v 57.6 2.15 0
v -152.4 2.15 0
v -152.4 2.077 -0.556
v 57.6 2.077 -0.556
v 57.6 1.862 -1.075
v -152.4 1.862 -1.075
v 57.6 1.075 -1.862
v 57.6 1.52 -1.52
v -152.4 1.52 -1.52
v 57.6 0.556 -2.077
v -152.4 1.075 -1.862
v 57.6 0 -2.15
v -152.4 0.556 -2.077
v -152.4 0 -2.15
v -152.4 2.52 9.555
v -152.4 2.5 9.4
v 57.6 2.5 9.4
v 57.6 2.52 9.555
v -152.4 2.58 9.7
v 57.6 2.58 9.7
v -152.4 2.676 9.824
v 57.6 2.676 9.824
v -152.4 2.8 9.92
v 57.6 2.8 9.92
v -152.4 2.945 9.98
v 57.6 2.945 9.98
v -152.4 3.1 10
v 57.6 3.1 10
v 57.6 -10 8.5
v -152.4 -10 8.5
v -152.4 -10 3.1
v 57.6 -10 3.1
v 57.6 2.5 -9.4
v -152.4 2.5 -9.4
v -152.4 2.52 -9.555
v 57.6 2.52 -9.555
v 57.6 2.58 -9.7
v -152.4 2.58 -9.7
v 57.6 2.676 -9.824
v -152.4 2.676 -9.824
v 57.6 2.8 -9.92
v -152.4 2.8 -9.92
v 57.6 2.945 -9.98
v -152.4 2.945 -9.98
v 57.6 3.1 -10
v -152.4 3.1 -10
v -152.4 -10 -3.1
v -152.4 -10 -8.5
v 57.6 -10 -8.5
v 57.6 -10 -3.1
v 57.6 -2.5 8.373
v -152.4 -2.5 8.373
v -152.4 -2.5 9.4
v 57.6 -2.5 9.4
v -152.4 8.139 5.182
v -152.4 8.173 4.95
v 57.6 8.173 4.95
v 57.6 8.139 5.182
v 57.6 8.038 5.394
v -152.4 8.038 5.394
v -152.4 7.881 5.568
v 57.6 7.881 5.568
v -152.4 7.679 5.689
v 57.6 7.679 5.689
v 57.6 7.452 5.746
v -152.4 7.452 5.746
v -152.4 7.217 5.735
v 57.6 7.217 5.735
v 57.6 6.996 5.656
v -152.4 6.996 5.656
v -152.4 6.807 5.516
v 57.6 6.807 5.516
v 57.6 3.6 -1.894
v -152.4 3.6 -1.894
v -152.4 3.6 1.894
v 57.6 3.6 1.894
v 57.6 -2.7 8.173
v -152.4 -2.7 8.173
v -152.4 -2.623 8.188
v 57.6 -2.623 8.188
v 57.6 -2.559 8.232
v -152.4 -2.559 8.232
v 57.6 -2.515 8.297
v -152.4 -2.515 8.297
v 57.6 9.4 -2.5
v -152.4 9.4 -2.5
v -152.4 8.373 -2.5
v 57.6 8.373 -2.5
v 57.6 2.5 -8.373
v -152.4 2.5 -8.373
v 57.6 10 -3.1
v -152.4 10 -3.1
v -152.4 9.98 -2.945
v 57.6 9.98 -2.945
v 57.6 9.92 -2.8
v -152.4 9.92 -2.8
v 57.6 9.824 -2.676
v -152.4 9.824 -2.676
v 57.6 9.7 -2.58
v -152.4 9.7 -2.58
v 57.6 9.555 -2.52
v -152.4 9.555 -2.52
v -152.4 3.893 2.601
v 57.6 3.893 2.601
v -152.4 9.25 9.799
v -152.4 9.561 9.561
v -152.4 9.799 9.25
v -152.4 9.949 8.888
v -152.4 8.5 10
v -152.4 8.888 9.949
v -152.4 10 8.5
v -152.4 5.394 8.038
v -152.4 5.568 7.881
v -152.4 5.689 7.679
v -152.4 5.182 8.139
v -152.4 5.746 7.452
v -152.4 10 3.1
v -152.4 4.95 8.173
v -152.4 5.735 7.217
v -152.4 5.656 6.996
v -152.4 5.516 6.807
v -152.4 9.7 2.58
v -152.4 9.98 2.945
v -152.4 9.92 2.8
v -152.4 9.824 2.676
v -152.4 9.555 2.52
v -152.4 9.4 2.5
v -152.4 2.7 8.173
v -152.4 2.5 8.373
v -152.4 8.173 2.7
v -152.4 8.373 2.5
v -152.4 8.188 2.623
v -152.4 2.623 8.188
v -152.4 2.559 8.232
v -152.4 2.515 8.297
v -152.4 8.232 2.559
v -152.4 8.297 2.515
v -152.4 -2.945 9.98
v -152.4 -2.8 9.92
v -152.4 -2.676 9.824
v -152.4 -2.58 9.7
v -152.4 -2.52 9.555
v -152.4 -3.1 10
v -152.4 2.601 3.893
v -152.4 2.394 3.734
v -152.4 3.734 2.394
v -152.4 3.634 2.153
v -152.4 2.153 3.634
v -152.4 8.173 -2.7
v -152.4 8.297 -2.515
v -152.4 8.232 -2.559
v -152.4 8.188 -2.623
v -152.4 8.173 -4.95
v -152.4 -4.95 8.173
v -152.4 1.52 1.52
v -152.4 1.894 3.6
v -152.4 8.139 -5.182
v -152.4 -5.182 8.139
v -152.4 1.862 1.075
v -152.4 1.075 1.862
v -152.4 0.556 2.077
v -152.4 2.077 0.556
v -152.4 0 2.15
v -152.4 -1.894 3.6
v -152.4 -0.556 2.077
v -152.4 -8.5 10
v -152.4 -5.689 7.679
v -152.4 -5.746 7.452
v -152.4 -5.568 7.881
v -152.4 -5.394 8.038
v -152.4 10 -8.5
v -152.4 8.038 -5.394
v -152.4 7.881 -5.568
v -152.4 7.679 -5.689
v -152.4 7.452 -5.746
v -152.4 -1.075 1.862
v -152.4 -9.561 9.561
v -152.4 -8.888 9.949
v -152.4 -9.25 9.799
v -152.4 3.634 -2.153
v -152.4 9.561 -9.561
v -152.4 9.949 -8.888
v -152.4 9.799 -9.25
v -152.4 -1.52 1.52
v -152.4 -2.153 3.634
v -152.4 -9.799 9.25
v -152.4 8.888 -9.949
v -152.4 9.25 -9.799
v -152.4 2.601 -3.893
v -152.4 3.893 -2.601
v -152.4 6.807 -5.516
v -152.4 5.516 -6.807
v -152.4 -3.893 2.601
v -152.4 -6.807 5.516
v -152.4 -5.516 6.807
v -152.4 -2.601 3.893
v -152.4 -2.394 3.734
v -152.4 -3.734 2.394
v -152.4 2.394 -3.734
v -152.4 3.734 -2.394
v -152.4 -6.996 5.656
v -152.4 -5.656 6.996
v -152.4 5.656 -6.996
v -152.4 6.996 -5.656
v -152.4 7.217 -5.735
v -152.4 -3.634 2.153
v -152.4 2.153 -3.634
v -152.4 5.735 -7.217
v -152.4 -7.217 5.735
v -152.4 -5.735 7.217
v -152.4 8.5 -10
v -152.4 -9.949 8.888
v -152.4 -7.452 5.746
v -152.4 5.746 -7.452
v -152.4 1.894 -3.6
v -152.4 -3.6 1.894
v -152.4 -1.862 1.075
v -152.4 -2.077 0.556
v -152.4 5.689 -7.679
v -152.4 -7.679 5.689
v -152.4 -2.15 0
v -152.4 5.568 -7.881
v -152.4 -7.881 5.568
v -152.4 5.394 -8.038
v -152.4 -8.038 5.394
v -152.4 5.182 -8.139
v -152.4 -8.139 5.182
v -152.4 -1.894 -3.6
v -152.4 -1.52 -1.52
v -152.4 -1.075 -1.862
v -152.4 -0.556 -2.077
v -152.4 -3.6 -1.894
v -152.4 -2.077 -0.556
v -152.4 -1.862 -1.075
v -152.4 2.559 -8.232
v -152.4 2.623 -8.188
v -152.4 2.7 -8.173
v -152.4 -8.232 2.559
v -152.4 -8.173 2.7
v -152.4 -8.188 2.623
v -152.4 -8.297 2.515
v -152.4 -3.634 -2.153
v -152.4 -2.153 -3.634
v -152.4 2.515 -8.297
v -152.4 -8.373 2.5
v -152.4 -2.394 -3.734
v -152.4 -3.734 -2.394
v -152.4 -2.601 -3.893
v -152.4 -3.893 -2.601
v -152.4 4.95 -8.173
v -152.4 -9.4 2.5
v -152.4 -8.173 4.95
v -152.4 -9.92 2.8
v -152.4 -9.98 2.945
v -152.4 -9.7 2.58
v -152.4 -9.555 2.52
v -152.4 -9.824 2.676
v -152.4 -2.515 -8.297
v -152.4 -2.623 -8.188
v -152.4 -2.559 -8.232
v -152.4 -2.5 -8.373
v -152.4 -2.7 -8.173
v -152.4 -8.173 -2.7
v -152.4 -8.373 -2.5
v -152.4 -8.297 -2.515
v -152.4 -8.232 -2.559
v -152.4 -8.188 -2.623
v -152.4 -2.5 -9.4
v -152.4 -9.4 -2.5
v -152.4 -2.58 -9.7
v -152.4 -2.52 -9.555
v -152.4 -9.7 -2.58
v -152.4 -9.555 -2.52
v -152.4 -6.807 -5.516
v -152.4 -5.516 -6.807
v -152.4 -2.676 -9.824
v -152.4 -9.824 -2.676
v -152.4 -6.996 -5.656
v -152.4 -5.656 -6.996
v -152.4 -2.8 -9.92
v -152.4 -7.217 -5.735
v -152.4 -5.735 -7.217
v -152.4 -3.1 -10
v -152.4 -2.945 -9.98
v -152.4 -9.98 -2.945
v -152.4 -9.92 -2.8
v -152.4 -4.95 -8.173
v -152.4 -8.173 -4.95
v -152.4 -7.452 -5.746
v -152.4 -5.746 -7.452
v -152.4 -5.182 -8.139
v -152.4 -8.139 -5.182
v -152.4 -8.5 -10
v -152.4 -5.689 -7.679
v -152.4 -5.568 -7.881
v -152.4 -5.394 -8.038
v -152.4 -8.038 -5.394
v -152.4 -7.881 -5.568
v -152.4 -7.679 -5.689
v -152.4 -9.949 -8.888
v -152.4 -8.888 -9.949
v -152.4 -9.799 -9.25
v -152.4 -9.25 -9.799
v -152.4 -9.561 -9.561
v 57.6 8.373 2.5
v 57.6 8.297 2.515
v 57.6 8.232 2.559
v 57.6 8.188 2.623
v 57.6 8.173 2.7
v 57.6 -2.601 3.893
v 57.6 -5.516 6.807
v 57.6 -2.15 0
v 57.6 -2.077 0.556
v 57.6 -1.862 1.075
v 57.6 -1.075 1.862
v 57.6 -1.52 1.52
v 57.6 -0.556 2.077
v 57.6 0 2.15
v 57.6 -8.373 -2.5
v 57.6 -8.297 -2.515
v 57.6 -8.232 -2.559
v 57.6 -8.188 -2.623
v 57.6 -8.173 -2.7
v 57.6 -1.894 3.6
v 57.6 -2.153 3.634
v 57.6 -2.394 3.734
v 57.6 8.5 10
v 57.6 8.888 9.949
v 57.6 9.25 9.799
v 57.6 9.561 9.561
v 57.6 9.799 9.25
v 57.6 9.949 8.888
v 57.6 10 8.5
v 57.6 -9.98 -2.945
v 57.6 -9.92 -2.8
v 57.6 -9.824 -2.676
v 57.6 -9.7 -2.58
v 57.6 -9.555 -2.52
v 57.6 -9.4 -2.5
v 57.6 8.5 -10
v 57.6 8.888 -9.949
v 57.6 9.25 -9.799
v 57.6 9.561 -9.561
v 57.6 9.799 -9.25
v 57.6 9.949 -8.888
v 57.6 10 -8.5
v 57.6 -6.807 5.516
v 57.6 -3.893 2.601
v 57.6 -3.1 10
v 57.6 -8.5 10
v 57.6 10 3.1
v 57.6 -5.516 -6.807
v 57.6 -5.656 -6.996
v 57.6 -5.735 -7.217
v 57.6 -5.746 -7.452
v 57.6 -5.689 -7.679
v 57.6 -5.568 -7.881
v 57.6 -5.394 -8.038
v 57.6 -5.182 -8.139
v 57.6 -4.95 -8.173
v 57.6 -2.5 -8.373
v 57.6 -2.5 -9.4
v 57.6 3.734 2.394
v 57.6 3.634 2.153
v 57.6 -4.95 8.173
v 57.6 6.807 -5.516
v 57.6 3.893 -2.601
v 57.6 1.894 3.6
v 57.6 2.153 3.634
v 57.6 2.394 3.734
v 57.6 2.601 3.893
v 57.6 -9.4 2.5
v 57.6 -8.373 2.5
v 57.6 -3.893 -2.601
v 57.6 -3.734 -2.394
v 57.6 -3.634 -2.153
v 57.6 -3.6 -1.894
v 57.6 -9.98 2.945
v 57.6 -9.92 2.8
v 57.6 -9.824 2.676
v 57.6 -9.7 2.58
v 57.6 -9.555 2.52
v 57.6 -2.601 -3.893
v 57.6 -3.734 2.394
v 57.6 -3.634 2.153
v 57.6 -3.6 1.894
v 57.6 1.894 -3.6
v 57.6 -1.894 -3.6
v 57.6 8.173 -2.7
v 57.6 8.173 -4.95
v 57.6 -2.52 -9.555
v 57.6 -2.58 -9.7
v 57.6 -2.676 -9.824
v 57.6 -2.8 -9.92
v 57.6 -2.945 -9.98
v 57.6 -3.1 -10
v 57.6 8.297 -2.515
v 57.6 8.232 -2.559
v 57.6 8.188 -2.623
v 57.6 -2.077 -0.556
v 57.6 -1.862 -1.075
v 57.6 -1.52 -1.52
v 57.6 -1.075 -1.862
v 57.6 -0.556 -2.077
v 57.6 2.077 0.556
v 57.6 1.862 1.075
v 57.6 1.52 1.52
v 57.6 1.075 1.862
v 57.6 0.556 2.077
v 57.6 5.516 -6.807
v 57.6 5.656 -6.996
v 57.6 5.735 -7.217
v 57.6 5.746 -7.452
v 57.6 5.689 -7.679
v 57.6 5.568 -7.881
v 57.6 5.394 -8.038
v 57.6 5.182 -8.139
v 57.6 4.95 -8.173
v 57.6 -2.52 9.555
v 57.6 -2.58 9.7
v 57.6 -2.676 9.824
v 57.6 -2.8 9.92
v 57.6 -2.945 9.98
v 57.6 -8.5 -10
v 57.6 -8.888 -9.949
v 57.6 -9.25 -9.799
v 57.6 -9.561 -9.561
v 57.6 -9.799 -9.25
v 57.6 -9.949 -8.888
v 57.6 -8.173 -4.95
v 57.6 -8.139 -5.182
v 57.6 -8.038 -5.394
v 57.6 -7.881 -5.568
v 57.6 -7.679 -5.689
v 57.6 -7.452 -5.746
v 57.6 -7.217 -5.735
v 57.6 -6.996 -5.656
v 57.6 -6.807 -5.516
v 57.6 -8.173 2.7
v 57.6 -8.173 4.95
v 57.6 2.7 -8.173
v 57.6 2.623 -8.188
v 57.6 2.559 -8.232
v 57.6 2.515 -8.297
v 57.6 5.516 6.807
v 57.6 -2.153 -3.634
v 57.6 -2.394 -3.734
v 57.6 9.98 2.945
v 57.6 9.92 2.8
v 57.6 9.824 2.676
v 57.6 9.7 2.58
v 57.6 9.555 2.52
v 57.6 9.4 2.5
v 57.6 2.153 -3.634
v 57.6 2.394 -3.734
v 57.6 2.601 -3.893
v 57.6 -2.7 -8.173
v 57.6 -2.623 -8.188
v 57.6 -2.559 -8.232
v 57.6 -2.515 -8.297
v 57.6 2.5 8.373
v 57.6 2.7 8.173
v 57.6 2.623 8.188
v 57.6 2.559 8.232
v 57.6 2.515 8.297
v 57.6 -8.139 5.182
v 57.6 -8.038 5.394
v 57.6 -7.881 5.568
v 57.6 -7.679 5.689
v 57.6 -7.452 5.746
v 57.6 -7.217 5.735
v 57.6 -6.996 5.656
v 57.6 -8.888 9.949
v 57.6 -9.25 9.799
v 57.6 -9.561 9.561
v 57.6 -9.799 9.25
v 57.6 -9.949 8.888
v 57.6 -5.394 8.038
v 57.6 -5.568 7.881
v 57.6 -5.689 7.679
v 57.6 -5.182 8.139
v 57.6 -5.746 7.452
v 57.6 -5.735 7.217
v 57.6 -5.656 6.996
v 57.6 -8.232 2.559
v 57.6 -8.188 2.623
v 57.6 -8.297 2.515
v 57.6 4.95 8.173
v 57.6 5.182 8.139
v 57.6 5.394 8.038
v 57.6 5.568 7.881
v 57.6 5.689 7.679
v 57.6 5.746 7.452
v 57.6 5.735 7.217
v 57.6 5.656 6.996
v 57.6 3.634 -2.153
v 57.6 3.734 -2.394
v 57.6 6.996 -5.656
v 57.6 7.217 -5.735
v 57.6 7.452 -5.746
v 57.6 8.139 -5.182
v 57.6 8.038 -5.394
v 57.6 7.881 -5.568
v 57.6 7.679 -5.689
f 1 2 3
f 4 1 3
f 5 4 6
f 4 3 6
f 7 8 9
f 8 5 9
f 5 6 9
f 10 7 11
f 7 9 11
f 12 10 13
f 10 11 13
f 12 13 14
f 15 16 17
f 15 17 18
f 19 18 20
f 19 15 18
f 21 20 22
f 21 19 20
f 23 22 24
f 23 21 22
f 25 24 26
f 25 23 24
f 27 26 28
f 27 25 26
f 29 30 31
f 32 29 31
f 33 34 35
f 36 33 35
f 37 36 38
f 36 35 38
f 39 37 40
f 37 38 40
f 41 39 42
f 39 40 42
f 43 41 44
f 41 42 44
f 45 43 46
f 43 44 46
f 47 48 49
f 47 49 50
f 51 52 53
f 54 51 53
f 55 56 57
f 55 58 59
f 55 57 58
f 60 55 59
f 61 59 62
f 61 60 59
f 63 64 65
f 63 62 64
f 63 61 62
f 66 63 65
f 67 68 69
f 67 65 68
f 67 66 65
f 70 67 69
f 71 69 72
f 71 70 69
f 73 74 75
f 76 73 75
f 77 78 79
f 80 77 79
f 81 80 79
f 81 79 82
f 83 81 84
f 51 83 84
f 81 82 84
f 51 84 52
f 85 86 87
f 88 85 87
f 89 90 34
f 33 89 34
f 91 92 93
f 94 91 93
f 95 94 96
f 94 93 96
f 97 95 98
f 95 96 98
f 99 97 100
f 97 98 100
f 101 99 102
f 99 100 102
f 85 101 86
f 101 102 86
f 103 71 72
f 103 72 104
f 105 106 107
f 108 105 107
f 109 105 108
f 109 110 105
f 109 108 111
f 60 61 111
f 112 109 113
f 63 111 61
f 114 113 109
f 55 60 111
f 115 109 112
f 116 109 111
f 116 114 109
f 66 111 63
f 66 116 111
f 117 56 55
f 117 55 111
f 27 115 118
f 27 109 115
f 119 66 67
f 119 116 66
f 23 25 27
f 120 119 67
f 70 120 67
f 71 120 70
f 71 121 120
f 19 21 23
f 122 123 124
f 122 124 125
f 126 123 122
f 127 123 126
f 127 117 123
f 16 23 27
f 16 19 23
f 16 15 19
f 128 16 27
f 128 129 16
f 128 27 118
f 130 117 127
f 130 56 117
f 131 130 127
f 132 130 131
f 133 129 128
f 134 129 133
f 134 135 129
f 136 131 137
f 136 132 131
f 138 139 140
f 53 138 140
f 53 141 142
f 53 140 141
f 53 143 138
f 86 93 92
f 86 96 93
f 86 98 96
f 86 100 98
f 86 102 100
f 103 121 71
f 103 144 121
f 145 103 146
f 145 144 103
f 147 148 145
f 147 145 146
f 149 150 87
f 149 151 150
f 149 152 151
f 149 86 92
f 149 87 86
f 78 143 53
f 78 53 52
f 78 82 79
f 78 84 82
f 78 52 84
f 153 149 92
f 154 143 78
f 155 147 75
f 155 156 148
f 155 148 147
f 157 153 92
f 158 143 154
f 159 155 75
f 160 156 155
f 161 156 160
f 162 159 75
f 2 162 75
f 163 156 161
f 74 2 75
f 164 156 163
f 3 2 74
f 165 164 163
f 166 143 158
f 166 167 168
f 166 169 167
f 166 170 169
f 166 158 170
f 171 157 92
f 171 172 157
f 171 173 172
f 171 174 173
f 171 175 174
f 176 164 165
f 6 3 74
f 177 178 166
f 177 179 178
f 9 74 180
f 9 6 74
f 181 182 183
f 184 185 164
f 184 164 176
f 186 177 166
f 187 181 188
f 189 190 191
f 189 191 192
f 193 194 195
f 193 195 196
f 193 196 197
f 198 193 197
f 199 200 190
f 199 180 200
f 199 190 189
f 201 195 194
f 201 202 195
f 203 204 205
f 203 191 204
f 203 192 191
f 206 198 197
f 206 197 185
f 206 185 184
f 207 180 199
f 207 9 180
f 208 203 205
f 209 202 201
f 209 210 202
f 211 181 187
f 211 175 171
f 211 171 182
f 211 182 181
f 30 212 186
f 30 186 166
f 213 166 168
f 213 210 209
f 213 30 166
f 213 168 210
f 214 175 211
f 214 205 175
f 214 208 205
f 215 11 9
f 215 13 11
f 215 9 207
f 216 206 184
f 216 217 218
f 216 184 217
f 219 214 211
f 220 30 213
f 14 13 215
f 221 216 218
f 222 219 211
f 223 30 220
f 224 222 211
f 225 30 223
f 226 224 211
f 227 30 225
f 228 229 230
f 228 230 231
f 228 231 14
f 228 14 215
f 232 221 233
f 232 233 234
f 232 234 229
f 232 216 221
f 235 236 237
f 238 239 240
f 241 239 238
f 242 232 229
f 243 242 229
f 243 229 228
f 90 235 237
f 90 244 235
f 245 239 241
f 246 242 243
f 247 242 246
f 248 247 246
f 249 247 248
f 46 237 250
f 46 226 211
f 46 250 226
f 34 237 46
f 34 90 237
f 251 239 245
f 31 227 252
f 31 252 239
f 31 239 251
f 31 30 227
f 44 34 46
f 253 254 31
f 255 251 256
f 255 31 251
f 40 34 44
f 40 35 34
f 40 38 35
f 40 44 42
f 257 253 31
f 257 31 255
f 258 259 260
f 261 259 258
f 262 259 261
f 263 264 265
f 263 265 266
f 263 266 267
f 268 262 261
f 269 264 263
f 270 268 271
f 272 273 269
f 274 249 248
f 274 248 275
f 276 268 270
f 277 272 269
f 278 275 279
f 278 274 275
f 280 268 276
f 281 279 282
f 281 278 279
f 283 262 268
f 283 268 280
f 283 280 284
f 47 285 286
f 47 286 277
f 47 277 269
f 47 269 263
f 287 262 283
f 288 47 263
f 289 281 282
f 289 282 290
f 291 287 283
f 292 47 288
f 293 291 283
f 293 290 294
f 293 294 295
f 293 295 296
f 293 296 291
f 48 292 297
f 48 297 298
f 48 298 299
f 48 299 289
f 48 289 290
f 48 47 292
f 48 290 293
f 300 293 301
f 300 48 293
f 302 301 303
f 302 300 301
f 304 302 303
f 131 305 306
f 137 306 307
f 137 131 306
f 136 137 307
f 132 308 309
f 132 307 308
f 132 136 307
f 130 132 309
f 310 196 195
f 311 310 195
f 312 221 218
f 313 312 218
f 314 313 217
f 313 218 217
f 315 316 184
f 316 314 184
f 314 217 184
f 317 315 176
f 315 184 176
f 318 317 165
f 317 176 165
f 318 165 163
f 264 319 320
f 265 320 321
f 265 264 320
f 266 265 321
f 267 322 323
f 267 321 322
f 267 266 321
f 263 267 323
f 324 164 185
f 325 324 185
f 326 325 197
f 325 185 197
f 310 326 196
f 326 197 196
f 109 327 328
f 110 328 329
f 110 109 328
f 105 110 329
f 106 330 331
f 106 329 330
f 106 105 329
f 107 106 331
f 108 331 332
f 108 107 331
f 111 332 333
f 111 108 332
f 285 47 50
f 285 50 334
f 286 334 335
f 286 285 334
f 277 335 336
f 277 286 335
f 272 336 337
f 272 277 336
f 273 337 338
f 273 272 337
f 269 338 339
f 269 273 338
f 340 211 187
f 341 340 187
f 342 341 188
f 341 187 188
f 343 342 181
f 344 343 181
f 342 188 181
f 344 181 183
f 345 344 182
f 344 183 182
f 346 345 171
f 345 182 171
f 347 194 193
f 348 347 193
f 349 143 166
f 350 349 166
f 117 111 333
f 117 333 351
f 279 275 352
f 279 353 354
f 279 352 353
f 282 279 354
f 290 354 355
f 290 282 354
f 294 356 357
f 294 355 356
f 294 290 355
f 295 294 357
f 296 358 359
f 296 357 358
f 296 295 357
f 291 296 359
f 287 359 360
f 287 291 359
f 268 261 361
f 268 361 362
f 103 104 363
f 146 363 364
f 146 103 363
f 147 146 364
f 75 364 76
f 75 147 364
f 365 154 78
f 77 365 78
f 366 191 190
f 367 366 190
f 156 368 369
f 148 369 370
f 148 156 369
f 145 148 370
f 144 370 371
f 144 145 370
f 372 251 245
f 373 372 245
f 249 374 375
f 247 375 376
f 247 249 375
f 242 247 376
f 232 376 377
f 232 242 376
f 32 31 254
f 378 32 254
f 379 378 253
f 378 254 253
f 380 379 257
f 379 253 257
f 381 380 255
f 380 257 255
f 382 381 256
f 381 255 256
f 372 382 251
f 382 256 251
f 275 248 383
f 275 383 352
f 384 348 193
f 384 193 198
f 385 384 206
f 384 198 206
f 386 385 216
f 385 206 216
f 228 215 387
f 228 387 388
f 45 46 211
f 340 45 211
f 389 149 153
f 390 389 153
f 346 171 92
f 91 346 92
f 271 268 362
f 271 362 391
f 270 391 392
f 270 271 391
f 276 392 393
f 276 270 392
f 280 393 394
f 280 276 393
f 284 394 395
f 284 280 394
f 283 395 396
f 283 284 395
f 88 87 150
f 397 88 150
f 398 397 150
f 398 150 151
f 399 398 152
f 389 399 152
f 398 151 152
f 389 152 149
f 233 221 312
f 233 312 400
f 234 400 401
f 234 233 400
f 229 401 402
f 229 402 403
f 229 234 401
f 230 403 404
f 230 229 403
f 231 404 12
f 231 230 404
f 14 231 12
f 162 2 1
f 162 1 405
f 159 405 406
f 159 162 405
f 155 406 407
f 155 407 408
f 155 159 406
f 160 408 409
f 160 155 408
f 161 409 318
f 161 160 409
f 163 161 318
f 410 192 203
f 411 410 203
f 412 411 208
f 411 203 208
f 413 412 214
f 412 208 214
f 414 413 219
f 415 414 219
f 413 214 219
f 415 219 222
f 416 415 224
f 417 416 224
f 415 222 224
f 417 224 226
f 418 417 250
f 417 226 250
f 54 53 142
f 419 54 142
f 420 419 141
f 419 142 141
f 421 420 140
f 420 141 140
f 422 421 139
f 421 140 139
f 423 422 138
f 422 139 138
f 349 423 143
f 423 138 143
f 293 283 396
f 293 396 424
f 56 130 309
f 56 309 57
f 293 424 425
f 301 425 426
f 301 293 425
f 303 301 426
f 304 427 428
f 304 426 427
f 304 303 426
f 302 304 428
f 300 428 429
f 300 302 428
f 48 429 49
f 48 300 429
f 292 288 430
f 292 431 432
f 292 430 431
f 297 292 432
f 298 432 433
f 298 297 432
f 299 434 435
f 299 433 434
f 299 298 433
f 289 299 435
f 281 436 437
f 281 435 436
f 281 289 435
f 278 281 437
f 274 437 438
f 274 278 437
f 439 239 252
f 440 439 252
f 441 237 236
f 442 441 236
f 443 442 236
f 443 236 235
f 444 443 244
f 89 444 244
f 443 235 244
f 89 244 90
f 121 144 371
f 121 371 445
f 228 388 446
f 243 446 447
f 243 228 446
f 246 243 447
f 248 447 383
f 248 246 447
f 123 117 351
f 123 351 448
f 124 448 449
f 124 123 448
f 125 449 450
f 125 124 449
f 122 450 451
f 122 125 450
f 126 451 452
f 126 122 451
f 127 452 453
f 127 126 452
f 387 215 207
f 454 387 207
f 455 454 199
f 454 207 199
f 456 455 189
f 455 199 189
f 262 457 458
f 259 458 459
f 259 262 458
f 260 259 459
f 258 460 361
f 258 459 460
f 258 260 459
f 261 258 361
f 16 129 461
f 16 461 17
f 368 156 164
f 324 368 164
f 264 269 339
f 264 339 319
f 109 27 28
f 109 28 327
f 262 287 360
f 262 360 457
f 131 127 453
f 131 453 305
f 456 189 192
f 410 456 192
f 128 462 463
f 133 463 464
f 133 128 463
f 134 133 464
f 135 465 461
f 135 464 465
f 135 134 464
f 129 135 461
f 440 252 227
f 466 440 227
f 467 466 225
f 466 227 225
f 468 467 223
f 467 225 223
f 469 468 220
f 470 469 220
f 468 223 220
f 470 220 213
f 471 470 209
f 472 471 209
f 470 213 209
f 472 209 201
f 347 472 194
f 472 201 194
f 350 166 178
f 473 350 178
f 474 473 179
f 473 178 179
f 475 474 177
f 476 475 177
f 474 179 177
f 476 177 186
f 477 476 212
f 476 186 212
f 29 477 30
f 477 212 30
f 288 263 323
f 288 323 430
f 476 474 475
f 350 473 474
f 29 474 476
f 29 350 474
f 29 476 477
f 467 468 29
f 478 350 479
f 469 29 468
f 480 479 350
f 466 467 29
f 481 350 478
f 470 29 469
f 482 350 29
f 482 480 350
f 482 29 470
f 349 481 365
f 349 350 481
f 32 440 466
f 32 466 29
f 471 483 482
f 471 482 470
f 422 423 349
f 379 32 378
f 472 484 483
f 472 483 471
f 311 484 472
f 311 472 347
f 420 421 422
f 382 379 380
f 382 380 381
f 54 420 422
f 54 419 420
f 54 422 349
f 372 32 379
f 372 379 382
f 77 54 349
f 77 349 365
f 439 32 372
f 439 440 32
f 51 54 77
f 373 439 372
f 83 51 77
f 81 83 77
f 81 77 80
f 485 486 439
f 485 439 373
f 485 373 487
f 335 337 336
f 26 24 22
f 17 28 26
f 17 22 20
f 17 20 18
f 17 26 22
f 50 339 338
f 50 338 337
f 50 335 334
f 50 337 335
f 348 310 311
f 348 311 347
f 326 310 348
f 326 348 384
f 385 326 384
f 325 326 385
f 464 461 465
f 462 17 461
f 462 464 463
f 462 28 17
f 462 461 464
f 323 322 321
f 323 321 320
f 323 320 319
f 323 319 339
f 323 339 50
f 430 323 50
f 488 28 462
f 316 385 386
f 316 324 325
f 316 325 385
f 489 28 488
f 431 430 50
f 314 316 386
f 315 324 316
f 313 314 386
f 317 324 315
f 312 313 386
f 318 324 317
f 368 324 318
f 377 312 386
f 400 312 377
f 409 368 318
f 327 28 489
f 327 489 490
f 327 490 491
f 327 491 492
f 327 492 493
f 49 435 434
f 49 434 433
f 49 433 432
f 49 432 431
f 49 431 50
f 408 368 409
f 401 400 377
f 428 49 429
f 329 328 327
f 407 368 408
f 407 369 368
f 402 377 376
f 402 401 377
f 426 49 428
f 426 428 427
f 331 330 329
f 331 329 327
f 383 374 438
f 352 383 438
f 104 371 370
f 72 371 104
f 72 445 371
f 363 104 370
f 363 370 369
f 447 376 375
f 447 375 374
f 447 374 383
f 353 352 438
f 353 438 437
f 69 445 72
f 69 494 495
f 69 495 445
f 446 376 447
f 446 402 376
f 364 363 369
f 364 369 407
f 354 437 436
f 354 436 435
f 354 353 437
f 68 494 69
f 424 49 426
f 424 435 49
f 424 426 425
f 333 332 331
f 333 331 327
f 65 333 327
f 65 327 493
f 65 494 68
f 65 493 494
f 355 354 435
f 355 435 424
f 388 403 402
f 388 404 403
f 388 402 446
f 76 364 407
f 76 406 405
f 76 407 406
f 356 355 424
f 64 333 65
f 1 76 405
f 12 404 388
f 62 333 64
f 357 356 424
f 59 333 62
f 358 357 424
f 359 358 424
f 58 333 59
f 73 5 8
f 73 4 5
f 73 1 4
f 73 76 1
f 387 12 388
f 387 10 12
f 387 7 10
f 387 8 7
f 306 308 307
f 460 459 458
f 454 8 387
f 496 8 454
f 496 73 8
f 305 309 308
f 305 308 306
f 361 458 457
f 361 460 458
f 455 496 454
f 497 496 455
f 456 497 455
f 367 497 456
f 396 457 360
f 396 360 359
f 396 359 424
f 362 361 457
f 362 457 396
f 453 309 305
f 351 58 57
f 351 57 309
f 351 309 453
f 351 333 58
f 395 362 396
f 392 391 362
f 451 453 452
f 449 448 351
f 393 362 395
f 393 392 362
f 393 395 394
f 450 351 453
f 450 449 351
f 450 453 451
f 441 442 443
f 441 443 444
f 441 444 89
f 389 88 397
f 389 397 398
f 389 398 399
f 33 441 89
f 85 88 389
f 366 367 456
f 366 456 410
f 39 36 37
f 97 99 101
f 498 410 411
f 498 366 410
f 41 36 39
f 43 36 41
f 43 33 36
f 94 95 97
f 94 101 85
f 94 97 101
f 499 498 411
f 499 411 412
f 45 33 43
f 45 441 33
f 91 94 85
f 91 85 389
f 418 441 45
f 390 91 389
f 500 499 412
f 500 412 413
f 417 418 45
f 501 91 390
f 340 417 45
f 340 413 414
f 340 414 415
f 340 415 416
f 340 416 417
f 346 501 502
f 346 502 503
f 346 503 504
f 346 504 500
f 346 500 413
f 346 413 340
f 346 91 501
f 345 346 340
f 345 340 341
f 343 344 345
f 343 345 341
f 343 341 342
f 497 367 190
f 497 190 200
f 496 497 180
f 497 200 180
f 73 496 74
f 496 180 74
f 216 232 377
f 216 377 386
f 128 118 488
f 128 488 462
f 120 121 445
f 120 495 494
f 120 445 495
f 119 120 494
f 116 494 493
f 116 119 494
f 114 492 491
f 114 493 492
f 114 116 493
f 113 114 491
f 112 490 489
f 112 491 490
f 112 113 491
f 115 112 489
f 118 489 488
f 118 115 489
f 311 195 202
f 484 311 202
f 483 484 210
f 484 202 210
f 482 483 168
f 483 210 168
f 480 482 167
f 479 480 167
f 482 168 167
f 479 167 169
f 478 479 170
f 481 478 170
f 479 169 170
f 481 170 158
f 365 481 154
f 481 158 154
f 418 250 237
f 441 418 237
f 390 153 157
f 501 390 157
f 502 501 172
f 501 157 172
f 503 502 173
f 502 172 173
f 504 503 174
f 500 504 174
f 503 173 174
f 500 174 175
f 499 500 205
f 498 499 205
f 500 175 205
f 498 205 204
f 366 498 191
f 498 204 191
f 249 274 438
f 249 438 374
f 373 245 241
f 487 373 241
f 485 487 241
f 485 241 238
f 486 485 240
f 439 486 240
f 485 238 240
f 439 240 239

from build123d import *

# Parameters (mm, degrees)
BOSS_EXTRUDE1_DEPTH      = 152.4
BOSS_EXTRUDE1_DEPTH_BACK = 152.4
CUT_EXTRUDE1_START       = -94.8
SKETCH4_R                = 2.15
CUT_EXTRUDE1_DEPTH       = 94.8


with BuildPart() as part:
    # Sketch3 → Boss-Extrude1 (new, two sides: drawn at the far end of the back side and taken through both)
    with BuildSketch(Plane(origin=(0, 0, 0), x_dir=(0, 0, -1), z_dir=(1, 0, 0)).offset(-BOSS_EXTRUDE1_DEPTH_BACK)):
        with BuildLine():
            Line((-5.515685425, 6.807463915), (-2.601114729, 3.892893219))
            ThreePointArc((-2.601114729, 3.892893219), (-2.27669138, 3.676120467), (-1.894007948, 3.6))
            Line((-1.894007948, 3.6), (0, 3.6))
            Line((0, 3.6), (0, 2.15))
            ThreePointArc((0, 2.15), (-1.52027958, 1.52027958), (-2.15, 0))
            Line((-2.15, 0), (-3.6, 0))
            Line((-3.6, 0), (-3.6, 1.894007948))
            ThreePointArc((-3.6, 1.894007948), (-3.676120467, 2.27669138), (-3.892893219, 2.601114729))
            Line((-3.892893219, 2.601114729), (-6.807463915, 5.515685425))
            ThreePointArc((-6.807463915, 5.515685425), (-7.679296086, 5.689103626), (-8.17314934, 4.95))
            Line((-8.17314934, 4.95), (-8.17314934, 2.7))
            ThreePointArc((-8.17314934, 2.7), (-8.231727984, 2.558578644), (-8.37314934, 2.5))
            Line((-8.37314934, 2.5), (-9.4, 2.5))
            ThreePointArc((-9.4, 2.5), (-9.824264069, 2.675735931), (-10, 3.1))
            Line((-10, 3.1), (-10, 8.5))
            ThreePointArc((-10, 8.5), (-9.560660172, 9.560660172), (-8.5, 10))
            Line((-8.5, 10), (-3.1, 10))
            ThreePointArc((-3.1, 10), (-2.675735931, 9.824264069), (-2.5, 9.4))
            Line((-2.5, 9.4), (-2.5, 8.37314934))
            ThreePointArc((-2.5, 8.37314934), (-2.558578644, 8.231727984), (-2.7, 8.17314934))
            Line((-2.7, 8.17314934), (-4.95, 8.17314934))
            ThreePointArc((-4.95, 8.17314934), (-5.689103626, 7.679296086), (-5.515685425, 6.807463915))
        make_face()
    extrude(amount=BOSS_EXTRUDE1_DEPTH + BOSS_EXTRUDE1_DEPTH_BACK)

    # Mirror1: part across plane


with BuildPart() as part_1:
    add(part.part)
    add(part.part.mirror(Plane.ZX))

    # Mirror2: part across plane


with BuildPart() as part_2:
    add(part_1.part)
    add(part_1.part.mirror(Plane.XY))

    # Sketch4 → Cut-Extrude1 (cut)
    with BuildSketch(Plane(origin=(152.4, 0, 0), x_dir=(0, 0, -1), z_dir=(1, 0, 0)).offset(CUT_EXTRUDE1_START)):
        with BuildLine():
            Line((1.894007948, 3.6), (-1.894007948, 3.6))
            ThreePointArc((-1.894007948, 3.6), (-2.27669138, 3.676120467), (-2.601114729, 3.892893219))
            Line((-2.601114729, 3.892893219), (-5.515685425, 6.807463915))
            ThreePointArc((-5.515685425, 6.807463915), (-5.689103626, 7.679296086), (-4.95, 8.17314934))
            Line((-4.95, 8.17314934), (-2.7, 8.17314934))
            ThreePointArc((-2.7, 8.17314934), (-2.558578644, 8.231727984), (-2.5, 8.37314934))
            Line((-2.5, 8.37314934), (-2.5, 9.4))
            ThreePointArc((-2.5, 9.4), (-2.675735931, 9.824264069), (-3.1, 10))
            Line((-3.1, 10), (-8.5, 10))
            ThreePointArc((-8.5, 10), (-9.560660172, 9.560660172), (-10, 8.5))
            Line((-10, 8.5), (-10, 3.1))
            ThreePointArc((-10, 3.1), (-9.824264069, 2.675735931), (-9.4, 2.5))
            Line((-9.4, 2.5), (-8.37314934, 2.5))
            ThreePointArc((-8.37314934, 2.5), (-8.231727984, 2.558578644), (-8.17314934, 2.7))
            Line((-8.17314934, 2.7), (-8.17314934, 4.95))
            ThreePointArc((-8.17314934, 4.95), (-7.679296086, 5.689103626), (-6.807463915, 5.515685425))
            Line((-6.807463915, 5.515685425), (-3.892893219, 2.601114729))
            ThreePointArc((-3.892893219, 2.601114729), (-3.676120467, 2.27669138), (-3.6, 1.894007948))
            Line((-3.6, 1.894007948), (-3.6, -1.894007948))
            ThreePointArc((-3.6, -1.894007948), (-3.676120467, -2.27669138), (-3.892893219, -2.601114729))
            Line((-3.892893219, -2.601114729), (-6.807463915, -5.515685425))
            ThreePointArc((-6.807463915, -5.515685425), (-7.679296086, -5.689103626), (-8.17314934, -4.95))
            Line((-8.17314934, -4.95), (-8.17314934, -2.7))
            ThreePointArc((-8.17314934, -2.7), (-8.231727984, -2.558578644), (-8.37314934, -2.5))
            Line((-8.37314934, -2.5), (-9.4, -2.5))
            ThreePointArc((-9.4, -2.5), (-9.824264069, -2.675735931), (-10, -3.1))
            Line((-10, -3.1), (-10, -8.5))
            ThreePointArc((-10, -8.5), (-9.560660172, -9.560660172), (-8.5, -10))
            Line((-8.5, -10), (-3.1, -10))
            ThreePointArc((-3.1, -10), (-2.675735931, -9.824264069), (-2.5, -9.4))
            Line((-2.5, -9.4), (-2.5, -8.37314934))
            ThreePointArc((-2.5, -8.37314934), (-2.558578644, -8.231727984), (-2.7, -8.17314934))
            Line((-2.7, -8.17314934), (-4.95, -8.17314934))
            ThreePointArc((-4.95, -8.17314934), (-5.689103626, -7.679296086), (-5.515685425, -6.807463915))
            Line((-5.515685425, -6.807463915), (-2.601114729, -3.892893219))
            ThreePointArc((-2.601114729, -3.892893219), (-2.27669138, -3.676120467), (-1.894007948, -3.6))
            Line((-1.894007948, -3.6), (1.894007948, -3.6))
            ThreePointArc((1.894007948, -3.6), (2.27669138, -3.676120467), (2.601114729, -3.892893219))
            Line((2.601114729, -3.892893219), (5.515685425, -6.807463915))
            ThreePointArc((5.515685425, -6.807463915), (5.689103626, -7.679296086), (4.95, -8.17314934))
            Line((4.95, -8.17314934), (2.7, -8.17314934))
            ThreePointArc((2.7, -8.17314934), (2.558578644, -8.231727984), (2.5, -8.37314934))
            Line((2.5, -8.37314934), (2.5, -9.4))
            ThreePointArc((2.5, -9.4), (2.675735931, -9.824264069), (3.1, -10))
            Line((3.1, -10), (8.5, -10))
            ThreePointArc((8.5, -10), (9.560660172, -9.560660172), (10, -8.5))
            Line((10, -8.5), (10, -3.1))
            ThreePointArc((10, -3.1), (9.824264069, -2.675735931), (9.4, -2.5))
            Line((9.4, -2.5), (8.37314934, -2.5))
            ThreePointArc((8.37314934, -2.5), (8.231727984, -2.558578644), (8.17314934, -2.7))
            Line((8.17314934, -2.7), (8.17314934, -4.95))
            ThreePointArc((8.17314934, -4.95), (7.679296086, -5.689103626), (6.807463915, -5.515685425))
            Line((6.807463915, -5.515685425), (3.892893219, -2.601114729))
            ThreePointArc((3.892893219, -2.601114729), (3.676120467, -2.27669138), (3.6, -1.894007948))
            Line((3.6, -1.894007948), (3.6, 1.894007948))
            ThreePointArc((3.6, 1.894007948), (3.676120467, 2.27669138), (3.892893219, 2.601114729))
            Line((3.892893219, 2.601114729), (6.807463915, 5.515685425))
            ThreePointArc((6.807463915, 5.515685425), (7.679296086, 5.689103626), (8.17314934, 4.95))
            Line((8.17314934, 4.95), (8.17314934, 2.7))
            ThreePointArc((8.17314934, 2.7), (8.231727984, 2.558578644), (8.37314934, 2.5))
            Line((8.37314934, 2.5), (9.4, 2.5))
            ThreePointArc((9.4, 2.5), (9.824264069, 2.675735931), (10, 3.1))
            Line((10, 3.1), (10, 8.5))
            ThreePointArc((10, 8.5), (9.560660172, 9.560660172), (8.5, 10))
            Line((8.5, 10), (3.1, 10))
            ThreePointArc((3.1, 10), (2.675735931, 9.824264069), (2.5, 9.4))
            Line((2.5, 9.4), (2.5, 8.37314934))
            ThreePointArc((2.5, 8.37314934), (2.558578644, 8.231727984), (2.7, 8.17314934))
            Line((2.7, 8.17314934), (4.95, 8.17314934))
            ThreePointArc((4.95, 8.17314934), (5.689103626, 7.679296086), (5.515685425, 6.807463915))
            Line((5.515685425, 6.807463915), (2.601114729, 3.892893219))
            ThreePointArc((2.601114729, 3.892893219), (2.27669138, 3.676120467), (1.894007948, 3.6))
        make_face()
        Circle(SKETCH4_R, mode=Mode.SUBTRACT)
    extrude(amount=CUT_EXTRUDE1_DEPTH, mode=Mode.SUBTRACT)


solid = part_2.part
